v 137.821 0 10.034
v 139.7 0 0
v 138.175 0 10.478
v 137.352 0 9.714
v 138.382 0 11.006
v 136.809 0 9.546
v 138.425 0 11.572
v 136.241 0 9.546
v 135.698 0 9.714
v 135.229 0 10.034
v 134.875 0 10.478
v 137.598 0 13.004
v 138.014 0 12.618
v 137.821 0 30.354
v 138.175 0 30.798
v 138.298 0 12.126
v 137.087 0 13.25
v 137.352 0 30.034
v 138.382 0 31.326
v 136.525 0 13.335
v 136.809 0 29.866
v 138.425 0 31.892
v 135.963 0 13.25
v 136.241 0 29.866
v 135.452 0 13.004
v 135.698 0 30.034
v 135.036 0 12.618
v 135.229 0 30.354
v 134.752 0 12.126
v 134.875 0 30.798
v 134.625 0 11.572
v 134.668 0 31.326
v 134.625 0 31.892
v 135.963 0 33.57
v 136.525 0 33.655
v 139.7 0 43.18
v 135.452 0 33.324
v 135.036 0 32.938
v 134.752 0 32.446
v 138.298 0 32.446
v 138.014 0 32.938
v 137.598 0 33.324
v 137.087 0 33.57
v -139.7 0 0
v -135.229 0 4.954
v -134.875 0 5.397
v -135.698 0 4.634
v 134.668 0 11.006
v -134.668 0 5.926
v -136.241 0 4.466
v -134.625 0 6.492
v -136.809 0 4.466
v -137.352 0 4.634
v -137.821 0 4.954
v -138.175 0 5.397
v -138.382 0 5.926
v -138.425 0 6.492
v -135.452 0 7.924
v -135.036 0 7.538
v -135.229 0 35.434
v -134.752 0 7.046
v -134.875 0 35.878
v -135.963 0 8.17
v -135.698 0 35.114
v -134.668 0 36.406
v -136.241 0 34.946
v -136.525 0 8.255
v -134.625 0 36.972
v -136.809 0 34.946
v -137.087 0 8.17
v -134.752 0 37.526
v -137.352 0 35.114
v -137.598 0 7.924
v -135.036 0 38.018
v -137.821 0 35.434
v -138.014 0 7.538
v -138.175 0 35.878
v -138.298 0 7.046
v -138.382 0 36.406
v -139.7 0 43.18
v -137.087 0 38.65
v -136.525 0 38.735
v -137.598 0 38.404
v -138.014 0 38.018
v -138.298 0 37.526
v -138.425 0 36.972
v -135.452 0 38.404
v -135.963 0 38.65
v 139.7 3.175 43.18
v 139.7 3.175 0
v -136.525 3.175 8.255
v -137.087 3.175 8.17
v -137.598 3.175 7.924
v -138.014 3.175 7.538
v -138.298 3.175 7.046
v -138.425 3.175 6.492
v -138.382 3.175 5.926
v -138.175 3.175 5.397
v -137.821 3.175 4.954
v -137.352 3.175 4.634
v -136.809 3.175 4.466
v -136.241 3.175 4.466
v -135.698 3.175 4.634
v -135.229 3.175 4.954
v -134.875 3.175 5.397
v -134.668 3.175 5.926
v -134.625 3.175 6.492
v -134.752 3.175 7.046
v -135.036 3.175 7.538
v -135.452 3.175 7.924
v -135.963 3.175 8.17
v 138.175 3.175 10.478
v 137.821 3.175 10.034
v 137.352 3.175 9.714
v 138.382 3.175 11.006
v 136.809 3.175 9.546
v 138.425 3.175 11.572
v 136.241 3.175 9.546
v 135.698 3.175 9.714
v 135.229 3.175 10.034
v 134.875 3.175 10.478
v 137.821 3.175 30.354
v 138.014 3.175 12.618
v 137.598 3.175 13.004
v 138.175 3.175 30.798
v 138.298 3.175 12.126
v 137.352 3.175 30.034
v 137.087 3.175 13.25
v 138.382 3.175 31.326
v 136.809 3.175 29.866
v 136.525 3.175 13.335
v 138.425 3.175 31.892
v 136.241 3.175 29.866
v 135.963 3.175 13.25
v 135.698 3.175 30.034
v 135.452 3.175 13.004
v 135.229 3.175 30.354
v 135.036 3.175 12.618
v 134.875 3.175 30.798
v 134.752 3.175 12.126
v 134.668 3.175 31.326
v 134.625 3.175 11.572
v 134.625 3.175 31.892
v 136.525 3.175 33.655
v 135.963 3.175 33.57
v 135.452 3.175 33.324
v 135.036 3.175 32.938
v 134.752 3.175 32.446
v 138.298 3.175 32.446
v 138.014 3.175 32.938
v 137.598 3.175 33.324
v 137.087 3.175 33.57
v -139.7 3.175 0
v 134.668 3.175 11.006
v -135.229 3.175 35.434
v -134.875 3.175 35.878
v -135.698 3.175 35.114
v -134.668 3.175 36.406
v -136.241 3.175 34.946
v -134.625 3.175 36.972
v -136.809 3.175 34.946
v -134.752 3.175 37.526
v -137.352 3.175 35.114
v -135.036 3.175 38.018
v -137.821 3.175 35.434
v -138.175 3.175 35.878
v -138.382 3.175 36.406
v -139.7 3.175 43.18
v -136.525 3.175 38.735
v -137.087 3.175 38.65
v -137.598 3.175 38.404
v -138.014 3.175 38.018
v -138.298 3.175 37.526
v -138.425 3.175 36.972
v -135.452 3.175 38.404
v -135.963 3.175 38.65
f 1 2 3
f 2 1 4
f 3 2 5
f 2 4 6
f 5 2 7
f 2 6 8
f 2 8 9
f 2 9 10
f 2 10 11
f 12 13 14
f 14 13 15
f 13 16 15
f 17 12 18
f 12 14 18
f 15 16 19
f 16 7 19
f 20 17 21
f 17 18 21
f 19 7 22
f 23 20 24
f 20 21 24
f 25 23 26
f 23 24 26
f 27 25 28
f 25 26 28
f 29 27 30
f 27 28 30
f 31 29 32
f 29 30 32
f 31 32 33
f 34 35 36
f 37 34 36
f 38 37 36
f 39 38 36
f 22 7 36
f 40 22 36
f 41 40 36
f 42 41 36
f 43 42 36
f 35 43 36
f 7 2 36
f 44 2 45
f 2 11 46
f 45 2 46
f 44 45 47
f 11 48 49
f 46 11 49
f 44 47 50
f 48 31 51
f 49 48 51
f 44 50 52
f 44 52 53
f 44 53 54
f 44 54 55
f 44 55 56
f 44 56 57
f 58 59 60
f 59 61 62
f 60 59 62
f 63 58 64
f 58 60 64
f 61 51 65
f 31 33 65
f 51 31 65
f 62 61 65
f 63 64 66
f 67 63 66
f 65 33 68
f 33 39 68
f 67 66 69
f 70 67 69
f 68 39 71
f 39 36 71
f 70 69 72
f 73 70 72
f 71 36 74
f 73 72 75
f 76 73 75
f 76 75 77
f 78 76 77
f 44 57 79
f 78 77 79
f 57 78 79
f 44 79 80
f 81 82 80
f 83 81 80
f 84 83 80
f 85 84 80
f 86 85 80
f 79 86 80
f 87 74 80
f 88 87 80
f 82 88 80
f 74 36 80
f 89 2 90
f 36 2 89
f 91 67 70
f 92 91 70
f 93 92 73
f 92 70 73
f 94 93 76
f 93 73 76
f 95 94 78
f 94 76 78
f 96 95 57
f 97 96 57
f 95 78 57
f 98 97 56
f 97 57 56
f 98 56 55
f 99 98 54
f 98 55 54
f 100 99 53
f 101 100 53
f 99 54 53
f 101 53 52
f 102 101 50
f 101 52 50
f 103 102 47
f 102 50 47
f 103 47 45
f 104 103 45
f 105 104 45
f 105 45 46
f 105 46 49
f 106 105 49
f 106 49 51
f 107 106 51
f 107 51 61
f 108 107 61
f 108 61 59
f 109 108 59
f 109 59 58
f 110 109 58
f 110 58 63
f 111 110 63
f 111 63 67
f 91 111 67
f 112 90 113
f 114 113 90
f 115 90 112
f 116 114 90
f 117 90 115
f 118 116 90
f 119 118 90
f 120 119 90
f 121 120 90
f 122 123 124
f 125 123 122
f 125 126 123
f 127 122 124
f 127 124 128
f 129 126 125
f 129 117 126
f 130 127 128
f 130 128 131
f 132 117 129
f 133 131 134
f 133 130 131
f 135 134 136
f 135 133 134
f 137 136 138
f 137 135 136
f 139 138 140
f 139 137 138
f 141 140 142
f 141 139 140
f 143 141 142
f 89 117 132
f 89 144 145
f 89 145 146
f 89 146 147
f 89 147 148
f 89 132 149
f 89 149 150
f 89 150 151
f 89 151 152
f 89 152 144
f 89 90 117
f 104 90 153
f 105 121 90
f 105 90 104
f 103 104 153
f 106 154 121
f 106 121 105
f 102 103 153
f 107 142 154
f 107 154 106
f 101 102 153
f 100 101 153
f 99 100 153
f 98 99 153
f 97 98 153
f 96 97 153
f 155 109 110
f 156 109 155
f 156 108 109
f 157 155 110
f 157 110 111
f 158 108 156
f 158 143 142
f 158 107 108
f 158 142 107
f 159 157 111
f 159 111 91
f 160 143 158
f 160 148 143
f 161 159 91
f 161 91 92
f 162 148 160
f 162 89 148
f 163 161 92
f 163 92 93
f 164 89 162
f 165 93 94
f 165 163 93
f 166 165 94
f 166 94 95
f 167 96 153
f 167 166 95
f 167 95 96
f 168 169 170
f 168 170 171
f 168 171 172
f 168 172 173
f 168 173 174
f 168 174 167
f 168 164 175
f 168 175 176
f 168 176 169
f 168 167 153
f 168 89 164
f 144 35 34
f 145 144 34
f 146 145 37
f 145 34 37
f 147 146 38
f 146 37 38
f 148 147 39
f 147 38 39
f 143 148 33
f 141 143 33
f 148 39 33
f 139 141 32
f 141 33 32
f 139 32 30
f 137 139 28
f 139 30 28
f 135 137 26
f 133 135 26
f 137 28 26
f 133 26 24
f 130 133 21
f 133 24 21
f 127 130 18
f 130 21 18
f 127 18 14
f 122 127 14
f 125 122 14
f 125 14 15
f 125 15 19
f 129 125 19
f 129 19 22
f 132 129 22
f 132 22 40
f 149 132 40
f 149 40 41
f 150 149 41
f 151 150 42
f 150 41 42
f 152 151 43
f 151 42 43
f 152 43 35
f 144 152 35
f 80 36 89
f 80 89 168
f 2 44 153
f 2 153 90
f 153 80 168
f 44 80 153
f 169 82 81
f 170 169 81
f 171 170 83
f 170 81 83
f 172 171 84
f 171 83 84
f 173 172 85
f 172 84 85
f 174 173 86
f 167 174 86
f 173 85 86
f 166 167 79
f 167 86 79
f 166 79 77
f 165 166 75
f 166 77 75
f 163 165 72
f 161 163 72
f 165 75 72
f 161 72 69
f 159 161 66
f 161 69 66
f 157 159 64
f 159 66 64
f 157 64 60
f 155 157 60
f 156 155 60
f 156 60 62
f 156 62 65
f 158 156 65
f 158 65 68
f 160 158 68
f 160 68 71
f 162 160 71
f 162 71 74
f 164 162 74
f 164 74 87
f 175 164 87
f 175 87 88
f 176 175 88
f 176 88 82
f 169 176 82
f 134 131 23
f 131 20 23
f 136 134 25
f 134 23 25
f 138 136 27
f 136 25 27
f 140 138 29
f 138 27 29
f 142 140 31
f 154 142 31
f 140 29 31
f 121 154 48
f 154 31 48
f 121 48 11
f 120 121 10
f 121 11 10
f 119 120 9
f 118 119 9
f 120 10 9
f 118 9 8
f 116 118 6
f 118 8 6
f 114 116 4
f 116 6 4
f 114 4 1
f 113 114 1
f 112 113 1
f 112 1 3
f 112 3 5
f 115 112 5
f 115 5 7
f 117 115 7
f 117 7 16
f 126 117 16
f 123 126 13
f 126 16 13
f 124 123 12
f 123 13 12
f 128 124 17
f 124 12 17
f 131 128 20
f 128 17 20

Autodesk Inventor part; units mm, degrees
ref_plane "YZ Plane" through (0, 0, 0) normal (1, 0, 0) x (0, 1, 0)
ref_plane "XZ Plane" through (0, 0, 0) normal (0, 1, 0) x (-1, 0, 0)
ref_plane "XY Plane" through (0, 0, 0) normal (0, 0, 1) x (1, 0, 0)
sketch "Sketch10" plane through (0, 0, 0) normal (0, 1, 0) x (-1, 0, 0)
  line L0 (-139.7, 0) -> (-139.7, 43.18)
  line L1 (-139.7, 43.18) -> (139.7, 43.18)
  line L2 (139.7, 43.18) -> (139.7, 0)
  line L3 (139.7, 0) -> (-139.7, 0)
  point P0 (0, 0)
  point P1 (0, 0)
  dimension "d48" = 279.4
  dimension "d49" = 43.18
  dimension "d51" = 139.7
extrude "Extrusion8" add sketch "Sketch10" along normal blind 3.175
sketch "Sketch11" plane through (0, 3.175, 0) normal (0, 1, 0) x (1, 0, 0)
  line L0 (139.7, -43.18) -> (-139.7, -43.18)
  line L1 (139.7, 0) -> (139.7, -43.18)
  line L2 (139.7, 0) -> (-139.7, 0)
  line L3 (-139.7, 0) -> (-139.7, -43.18)
  line L4 (-139.7, 0) -> (-139.7, -43.18) projected
  line L5 (-139.7, -43.18) -> (139.7, -43.18) projected
  line L6 (139.7, -43.18) -> (139.7, 0) projected
  line L7 (139.7, 0) -> (-139.7, 0) projected
  line L8 (139.7, -43.18) -> (139.7, 0) projected
  point P0 (0, 0)
  point P1 (136.525, -31.75)
  point P2 (136.525, -11.43)
  point P3 (-136.525, -6.35)
  point P4 (-136.525, -36.83)
  dimension "d54" = 11.43
  dimension "d55" = 3.175
  dimension "d56" = 11.43
  dimension "d57" = 3.175
  dimension "d58" = 3.175
  dimension "d59" = 3.175
  dimension "d60" = 6.35
  dimension "d61" = 6.35
hole "Hole2" at (-136.525, 3.175, 36.83) at (-136.525, 3.175, 6.35) at (136.525, 3.175, 11.43) at (136.525, 3.175, 31.75) direction (0, -1, 0) diameter 3.81 end through all clearance for "Flat Head Machine Screw (82)" size "#6" standard "Ansi Unified Screw Threads"
equation "\"d51\" = 0.5 * d48"
properties part number "AR-Bracket(middle)2"
